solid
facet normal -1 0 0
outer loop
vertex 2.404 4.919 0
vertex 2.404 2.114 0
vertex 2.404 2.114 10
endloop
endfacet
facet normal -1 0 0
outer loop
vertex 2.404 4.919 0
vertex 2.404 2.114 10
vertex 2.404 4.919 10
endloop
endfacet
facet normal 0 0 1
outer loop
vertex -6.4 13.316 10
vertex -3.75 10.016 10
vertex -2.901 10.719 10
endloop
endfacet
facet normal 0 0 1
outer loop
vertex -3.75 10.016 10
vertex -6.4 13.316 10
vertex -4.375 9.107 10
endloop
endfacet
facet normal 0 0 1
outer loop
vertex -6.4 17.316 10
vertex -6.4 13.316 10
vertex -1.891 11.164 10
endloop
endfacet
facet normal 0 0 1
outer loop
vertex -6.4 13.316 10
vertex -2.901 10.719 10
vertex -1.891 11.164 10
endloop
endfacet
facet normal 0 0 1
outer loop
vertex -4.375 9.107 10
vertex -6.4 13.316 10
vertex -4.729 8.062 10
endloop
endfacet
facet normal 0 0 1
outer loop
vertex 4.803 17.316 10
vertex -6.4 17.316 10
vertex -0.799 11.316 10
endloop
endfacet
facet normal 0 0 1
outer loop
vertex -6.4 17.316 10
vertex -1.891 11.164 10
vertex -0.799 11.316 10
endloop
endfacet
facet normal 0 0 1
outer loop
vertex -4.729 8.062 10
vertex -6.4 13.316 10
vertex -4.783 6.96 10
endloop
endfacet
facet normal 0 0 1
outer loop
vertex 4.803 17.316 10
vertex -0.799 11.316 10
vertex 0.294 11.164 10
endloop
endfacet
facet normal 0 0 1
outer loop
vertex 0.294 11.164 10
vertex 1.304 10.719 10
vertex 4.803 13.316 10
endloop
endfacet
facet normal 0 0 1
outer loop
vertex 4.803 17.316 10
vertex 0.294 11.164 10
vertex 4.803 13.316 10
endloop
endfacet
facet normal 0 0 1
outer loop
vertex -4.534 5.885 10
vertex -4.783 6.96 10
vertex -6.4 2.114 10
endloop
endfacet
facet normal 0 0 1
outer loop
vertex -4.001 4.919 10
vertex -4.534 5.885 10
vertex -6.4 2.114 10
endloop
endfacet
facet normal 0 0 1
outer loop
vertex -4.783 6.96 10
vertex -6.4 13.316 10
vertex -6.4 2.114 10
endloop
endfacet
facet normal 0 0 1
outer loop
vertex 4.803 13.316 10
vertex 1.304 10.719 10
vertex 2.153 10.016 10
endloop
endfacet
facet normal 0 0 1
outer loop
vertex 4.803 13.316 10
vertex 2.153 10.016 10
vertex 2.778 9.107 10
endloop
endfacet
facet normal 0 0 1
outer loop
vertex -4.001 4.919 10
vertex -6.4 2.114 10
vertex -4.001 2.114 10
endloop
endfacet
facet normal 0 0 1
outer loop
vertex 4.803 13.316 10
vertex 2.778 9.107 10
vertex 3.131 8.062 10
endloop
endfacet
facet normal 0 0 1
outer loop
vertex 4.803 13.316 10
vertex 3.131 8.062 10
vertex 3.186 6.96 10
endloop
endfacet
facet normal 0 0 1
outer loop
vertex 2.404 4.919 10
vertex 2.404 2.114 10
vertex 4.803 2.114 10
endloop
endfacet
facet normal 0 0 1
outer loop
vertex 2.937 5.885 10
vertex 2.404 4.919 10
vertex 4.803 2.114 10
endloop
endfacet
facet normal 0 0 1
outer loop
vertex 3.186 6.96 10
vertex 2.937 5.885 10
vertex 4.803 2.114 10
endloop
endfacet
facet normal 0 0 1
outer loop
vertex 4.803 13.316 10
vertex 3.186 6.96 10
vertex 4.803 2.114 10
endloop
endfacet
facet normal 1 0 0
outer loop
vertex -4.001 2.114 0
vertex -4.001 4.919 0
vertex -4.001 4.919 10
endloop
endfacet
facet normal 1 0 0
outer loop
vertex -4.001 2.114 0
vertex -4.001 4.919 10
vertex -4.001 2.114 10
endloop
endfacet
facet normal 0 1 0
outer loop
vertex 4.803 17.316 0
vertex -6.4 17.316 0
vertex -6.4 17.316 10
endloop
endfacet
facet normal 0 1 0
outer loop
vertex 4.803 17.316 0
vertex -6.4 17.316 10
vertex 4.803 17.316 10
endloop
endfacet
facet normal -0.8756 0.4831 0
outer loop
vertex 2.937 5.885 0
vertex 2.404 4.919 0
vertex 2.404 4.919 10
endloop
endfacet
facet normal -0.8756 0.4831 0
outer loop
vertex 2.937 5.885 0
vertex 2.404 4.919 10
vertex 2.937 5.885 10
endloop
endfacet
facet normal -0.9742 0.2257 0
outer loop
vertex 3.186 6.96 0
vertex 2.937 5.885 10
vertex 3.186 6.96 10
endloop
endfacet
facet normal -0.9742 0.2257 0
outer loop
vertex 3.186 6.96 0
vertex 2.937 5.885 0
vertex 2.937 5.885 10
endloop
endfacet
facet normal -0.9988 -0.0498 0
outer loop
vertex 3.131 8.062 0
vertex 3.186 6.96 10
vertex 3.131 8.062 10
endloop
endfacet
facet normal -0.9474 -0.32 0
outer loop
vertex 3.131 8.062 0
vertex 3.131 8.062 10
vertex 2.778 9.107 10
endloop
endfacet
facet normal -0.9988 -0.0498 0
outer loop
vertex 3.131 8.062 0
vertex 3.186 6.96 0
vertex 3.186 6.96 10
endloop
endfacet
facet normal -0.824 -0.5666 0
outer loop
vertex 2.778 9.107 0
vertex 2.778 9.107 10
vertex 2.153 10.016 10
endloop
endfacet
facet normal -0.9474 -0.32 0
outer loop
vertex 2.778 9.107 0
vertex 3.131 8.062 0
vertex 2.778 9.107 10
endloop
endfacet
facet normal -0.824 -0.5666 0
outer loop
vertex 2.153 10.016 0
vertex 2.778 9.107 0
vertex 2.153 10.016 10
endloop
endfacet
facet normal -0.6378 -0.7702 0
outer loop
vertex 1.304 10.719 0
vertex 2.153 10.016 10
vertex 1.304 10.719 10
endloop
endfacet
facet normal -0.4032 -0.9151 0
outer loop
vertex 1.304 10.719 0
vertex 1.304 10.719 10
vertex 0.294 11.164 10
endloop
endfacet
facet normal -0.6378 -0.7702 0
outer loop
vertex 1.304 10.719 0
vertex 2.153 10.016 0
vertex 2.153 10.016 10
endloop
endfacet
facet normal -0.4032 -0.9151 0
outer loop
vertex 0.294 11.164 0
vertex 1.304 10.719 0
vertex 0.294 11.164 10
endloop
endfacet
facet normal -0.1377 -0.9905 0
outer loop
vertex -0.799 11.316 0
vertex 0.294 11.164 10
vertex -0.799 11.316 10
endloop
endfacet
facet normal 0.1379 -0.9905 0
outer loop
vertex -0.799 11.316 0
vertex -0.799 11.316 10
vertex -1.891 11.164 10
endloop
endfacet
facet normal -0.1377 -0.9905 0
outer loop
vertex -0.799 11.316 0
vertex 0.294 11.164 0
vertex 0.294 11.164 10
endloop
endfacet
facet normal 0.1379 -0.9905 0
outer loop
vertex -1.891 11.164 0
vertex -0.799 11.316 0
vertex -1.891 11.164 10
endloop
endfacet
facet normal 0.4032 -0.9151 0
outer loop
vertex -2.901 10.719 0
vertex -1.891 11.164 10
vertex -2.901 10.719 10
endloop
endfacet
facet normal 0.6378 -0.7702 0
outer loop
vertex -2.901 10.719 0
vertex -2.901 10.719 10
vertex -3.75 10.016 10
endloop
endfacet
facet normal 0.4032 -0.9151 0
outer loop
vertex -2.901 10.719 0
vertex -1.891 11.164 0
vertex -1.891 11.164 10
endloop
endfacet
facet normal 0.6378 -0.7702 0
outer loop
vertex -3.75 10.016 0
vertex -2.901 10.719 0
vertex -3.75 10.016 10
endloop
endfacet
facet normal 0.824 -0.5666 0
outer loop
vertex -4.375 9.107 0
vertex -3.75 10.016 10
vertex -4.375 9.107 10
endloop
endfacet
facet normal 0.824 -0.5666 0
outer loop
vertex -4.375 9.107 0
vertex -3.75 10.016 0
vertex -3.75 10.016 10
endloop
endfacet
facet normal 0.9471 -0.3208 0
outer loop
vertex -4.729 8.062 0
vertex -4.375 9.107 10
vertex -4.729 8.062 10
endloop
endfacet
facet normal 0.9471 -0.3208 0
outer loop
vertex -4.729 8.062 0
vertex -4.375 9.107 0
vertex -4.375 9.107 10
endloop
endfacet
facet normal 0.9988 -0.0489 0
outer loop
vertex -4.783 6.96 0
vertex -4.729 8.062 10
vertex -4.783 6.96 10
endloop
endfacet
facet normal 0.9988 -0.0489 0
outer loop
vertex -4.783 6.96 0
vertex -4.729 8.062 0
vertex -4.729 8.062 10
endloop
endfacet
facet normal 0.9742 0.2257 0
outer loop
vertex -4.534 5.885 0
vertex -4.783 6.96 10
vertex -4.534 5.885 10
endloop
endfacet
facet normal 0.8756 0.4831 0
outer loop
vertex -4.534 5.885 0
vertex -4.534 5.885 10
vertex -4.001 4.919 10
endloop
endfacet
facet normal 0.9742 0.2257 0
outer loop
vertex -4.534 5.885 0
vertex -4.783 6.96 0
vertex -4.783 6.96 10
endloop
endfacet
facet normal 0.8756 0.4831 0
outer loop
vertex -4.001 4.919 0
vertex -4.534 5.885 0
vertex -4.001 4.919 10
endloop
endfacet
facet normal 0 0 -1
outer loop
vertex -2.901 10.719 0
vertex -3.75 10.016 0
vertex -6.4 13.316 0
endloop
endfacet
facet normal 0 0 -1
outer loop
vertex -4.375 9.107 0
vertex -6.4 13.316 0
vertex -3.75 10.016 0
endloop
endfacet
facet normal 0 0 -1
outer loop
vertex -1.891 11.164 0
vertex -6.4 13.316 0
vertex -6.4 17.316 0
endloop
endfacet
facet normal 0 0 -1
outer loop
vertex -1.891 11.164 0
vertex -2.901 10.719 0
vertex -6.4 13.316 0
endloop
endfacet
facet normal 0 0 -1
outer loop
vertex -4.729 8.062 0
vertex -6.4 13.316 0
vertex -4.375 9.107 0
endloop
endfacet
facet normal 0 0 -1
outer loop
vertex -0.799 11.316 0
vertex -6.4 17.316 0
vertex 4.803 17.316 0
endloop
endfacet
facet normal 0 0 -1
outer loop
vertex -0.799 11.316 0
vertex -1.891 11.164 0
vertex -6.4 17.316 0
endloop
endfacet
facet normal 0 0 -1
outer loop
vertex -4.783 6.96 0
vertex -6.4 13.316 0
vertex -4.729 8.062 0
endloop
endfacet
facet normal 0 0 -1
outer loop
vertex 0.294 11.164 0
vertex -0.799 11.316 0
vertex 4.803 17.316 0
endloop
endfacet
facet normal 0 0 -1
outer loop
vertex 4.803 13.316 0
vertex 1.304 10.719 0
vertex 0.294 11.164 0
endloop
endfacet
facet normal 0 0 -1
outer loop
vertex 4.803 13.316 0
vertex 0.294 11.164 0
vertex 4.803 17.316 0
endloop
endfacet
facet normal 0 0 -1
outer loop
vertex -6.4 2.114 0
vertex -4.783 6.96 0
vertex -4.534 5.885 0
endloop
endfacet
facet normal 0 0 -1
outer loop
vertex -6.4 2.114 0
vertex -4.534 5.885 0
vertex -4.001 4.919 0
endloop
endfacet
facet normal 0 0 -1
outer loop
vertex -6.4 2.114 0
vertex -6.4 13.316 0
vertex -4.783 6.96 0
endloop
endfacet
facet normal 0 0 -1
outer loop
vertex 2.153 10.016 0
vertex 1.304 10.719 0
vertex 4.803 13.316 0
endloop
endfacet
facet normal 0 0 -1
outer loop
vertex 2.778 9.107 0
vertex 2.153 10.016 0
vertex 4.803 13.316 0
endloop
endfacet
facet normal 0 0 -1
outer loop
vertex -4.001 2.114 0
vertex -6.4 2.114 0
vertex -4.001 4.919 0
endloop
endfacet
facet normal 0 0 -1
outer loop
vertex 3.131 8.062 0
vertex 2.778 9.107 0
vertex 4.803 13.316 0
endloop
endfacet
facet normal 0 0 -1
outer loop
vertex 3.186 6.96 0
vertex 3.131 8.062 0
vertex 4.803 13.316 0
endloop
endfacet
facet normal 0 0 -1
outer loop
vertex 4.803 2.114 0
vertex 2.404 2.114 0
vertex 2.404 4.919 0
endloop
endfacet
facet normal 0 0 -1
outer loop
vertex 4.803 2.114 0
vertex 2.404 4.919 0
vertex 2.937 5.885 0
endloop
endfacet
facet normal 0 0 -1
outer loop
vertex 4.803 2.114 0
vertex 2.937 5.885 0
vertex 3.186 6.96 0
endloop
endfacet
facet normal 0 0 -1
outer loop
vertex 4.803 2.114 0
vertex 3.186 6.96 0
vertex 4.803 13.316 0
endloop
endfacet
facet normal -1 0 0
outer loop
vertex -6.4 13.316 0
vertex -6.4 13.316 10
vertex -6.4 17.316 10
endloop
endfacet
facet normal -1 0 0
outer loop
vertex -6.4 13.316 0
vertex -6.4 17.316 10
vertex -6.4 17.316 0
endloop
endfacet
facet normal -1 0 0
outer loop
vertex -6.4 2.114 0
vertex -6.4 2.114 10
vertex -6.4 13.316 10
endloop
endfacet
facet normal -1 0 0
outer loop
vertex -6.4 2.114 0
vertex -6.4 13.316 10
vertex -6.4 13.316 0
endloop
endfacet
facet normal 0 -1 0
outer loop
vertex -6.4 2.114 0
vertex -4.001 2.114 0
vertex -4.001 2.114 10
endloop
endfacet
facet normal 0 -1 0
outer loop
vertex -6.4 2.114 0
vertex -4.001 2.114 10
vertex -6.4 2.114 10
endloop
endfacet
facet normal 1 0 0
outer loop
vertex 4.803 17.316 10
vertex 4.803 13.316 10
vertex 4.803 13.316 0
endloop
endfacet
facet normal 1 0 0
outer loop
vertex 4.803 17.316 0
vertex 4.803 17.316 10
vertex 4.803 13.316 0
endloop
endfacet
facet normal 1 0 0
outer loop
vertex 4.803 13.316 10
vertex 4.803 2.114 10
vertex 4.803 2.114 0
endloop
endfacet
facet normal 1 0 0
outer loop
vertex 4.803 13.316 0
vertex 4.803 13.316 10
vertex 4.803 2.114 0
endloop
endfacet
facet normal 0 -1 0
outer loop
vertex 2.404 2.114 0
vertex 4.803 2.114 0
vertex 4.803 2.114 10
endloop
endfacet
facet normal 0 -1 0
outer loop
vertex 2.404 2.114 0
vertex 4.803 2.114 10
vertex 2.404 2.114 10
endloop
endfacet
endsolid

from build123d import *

# Parameters (mm, degrees)
BOSS_EXTRUDE1_DEPTH = 10
SKETCH2_W           = 11.202256629
SKETCH2_H           = 10
BOSS_EXTRUDE2_DEPTH = 4


with BuildPart() as part:
    # Sketch1 → Boss-Extrude1 (new body)
    with BuildSketch(Plane.XY):
        with BuildLine():
            Line((-4.000846014, 2.113625207), (-6.3997177, 2.113625207))
            Line((-6.3997177, 2.113625207), (-6.3997177, 13.316105715))
            Line((-6.3997177, 13.316105715), (4.802538929, 13.316105715))
            Line((4.802538929, 13.316105715), (4.802538929, 2.113625207))
            Line((4.802538929, 2.113625207), (2.403667244, 2.113625207))
            Line((2.403667244, 2.113625207), (2.403667244, 4.919117505))
            ThreePointArc((2.403667244, 4.919117505), (-0.798589385, 11.316105715), (-4.000846014, 4.919117505))
            Line((-4.000846014, 4.919117505), (-4.000846014, 2.113625207))
        make_face()
    extrude(amount=BOSS_EXTRUDE1_DEPTH)

    # Sketch2 → Boss-Extrude2 (add)
    with BuildSketch(Plane(origin=(0, 13.316105715, 0), x_dir=(1, 0, 0), z_dir=(0, 1, 0))):
        with Locations((-0.798589385, -5)):
            Rectangle(SKETCH2_W, SKETCH2_H)
    extrude(amount=BOSS_EXTRUDE2_DEPTH)


solid = part.part
